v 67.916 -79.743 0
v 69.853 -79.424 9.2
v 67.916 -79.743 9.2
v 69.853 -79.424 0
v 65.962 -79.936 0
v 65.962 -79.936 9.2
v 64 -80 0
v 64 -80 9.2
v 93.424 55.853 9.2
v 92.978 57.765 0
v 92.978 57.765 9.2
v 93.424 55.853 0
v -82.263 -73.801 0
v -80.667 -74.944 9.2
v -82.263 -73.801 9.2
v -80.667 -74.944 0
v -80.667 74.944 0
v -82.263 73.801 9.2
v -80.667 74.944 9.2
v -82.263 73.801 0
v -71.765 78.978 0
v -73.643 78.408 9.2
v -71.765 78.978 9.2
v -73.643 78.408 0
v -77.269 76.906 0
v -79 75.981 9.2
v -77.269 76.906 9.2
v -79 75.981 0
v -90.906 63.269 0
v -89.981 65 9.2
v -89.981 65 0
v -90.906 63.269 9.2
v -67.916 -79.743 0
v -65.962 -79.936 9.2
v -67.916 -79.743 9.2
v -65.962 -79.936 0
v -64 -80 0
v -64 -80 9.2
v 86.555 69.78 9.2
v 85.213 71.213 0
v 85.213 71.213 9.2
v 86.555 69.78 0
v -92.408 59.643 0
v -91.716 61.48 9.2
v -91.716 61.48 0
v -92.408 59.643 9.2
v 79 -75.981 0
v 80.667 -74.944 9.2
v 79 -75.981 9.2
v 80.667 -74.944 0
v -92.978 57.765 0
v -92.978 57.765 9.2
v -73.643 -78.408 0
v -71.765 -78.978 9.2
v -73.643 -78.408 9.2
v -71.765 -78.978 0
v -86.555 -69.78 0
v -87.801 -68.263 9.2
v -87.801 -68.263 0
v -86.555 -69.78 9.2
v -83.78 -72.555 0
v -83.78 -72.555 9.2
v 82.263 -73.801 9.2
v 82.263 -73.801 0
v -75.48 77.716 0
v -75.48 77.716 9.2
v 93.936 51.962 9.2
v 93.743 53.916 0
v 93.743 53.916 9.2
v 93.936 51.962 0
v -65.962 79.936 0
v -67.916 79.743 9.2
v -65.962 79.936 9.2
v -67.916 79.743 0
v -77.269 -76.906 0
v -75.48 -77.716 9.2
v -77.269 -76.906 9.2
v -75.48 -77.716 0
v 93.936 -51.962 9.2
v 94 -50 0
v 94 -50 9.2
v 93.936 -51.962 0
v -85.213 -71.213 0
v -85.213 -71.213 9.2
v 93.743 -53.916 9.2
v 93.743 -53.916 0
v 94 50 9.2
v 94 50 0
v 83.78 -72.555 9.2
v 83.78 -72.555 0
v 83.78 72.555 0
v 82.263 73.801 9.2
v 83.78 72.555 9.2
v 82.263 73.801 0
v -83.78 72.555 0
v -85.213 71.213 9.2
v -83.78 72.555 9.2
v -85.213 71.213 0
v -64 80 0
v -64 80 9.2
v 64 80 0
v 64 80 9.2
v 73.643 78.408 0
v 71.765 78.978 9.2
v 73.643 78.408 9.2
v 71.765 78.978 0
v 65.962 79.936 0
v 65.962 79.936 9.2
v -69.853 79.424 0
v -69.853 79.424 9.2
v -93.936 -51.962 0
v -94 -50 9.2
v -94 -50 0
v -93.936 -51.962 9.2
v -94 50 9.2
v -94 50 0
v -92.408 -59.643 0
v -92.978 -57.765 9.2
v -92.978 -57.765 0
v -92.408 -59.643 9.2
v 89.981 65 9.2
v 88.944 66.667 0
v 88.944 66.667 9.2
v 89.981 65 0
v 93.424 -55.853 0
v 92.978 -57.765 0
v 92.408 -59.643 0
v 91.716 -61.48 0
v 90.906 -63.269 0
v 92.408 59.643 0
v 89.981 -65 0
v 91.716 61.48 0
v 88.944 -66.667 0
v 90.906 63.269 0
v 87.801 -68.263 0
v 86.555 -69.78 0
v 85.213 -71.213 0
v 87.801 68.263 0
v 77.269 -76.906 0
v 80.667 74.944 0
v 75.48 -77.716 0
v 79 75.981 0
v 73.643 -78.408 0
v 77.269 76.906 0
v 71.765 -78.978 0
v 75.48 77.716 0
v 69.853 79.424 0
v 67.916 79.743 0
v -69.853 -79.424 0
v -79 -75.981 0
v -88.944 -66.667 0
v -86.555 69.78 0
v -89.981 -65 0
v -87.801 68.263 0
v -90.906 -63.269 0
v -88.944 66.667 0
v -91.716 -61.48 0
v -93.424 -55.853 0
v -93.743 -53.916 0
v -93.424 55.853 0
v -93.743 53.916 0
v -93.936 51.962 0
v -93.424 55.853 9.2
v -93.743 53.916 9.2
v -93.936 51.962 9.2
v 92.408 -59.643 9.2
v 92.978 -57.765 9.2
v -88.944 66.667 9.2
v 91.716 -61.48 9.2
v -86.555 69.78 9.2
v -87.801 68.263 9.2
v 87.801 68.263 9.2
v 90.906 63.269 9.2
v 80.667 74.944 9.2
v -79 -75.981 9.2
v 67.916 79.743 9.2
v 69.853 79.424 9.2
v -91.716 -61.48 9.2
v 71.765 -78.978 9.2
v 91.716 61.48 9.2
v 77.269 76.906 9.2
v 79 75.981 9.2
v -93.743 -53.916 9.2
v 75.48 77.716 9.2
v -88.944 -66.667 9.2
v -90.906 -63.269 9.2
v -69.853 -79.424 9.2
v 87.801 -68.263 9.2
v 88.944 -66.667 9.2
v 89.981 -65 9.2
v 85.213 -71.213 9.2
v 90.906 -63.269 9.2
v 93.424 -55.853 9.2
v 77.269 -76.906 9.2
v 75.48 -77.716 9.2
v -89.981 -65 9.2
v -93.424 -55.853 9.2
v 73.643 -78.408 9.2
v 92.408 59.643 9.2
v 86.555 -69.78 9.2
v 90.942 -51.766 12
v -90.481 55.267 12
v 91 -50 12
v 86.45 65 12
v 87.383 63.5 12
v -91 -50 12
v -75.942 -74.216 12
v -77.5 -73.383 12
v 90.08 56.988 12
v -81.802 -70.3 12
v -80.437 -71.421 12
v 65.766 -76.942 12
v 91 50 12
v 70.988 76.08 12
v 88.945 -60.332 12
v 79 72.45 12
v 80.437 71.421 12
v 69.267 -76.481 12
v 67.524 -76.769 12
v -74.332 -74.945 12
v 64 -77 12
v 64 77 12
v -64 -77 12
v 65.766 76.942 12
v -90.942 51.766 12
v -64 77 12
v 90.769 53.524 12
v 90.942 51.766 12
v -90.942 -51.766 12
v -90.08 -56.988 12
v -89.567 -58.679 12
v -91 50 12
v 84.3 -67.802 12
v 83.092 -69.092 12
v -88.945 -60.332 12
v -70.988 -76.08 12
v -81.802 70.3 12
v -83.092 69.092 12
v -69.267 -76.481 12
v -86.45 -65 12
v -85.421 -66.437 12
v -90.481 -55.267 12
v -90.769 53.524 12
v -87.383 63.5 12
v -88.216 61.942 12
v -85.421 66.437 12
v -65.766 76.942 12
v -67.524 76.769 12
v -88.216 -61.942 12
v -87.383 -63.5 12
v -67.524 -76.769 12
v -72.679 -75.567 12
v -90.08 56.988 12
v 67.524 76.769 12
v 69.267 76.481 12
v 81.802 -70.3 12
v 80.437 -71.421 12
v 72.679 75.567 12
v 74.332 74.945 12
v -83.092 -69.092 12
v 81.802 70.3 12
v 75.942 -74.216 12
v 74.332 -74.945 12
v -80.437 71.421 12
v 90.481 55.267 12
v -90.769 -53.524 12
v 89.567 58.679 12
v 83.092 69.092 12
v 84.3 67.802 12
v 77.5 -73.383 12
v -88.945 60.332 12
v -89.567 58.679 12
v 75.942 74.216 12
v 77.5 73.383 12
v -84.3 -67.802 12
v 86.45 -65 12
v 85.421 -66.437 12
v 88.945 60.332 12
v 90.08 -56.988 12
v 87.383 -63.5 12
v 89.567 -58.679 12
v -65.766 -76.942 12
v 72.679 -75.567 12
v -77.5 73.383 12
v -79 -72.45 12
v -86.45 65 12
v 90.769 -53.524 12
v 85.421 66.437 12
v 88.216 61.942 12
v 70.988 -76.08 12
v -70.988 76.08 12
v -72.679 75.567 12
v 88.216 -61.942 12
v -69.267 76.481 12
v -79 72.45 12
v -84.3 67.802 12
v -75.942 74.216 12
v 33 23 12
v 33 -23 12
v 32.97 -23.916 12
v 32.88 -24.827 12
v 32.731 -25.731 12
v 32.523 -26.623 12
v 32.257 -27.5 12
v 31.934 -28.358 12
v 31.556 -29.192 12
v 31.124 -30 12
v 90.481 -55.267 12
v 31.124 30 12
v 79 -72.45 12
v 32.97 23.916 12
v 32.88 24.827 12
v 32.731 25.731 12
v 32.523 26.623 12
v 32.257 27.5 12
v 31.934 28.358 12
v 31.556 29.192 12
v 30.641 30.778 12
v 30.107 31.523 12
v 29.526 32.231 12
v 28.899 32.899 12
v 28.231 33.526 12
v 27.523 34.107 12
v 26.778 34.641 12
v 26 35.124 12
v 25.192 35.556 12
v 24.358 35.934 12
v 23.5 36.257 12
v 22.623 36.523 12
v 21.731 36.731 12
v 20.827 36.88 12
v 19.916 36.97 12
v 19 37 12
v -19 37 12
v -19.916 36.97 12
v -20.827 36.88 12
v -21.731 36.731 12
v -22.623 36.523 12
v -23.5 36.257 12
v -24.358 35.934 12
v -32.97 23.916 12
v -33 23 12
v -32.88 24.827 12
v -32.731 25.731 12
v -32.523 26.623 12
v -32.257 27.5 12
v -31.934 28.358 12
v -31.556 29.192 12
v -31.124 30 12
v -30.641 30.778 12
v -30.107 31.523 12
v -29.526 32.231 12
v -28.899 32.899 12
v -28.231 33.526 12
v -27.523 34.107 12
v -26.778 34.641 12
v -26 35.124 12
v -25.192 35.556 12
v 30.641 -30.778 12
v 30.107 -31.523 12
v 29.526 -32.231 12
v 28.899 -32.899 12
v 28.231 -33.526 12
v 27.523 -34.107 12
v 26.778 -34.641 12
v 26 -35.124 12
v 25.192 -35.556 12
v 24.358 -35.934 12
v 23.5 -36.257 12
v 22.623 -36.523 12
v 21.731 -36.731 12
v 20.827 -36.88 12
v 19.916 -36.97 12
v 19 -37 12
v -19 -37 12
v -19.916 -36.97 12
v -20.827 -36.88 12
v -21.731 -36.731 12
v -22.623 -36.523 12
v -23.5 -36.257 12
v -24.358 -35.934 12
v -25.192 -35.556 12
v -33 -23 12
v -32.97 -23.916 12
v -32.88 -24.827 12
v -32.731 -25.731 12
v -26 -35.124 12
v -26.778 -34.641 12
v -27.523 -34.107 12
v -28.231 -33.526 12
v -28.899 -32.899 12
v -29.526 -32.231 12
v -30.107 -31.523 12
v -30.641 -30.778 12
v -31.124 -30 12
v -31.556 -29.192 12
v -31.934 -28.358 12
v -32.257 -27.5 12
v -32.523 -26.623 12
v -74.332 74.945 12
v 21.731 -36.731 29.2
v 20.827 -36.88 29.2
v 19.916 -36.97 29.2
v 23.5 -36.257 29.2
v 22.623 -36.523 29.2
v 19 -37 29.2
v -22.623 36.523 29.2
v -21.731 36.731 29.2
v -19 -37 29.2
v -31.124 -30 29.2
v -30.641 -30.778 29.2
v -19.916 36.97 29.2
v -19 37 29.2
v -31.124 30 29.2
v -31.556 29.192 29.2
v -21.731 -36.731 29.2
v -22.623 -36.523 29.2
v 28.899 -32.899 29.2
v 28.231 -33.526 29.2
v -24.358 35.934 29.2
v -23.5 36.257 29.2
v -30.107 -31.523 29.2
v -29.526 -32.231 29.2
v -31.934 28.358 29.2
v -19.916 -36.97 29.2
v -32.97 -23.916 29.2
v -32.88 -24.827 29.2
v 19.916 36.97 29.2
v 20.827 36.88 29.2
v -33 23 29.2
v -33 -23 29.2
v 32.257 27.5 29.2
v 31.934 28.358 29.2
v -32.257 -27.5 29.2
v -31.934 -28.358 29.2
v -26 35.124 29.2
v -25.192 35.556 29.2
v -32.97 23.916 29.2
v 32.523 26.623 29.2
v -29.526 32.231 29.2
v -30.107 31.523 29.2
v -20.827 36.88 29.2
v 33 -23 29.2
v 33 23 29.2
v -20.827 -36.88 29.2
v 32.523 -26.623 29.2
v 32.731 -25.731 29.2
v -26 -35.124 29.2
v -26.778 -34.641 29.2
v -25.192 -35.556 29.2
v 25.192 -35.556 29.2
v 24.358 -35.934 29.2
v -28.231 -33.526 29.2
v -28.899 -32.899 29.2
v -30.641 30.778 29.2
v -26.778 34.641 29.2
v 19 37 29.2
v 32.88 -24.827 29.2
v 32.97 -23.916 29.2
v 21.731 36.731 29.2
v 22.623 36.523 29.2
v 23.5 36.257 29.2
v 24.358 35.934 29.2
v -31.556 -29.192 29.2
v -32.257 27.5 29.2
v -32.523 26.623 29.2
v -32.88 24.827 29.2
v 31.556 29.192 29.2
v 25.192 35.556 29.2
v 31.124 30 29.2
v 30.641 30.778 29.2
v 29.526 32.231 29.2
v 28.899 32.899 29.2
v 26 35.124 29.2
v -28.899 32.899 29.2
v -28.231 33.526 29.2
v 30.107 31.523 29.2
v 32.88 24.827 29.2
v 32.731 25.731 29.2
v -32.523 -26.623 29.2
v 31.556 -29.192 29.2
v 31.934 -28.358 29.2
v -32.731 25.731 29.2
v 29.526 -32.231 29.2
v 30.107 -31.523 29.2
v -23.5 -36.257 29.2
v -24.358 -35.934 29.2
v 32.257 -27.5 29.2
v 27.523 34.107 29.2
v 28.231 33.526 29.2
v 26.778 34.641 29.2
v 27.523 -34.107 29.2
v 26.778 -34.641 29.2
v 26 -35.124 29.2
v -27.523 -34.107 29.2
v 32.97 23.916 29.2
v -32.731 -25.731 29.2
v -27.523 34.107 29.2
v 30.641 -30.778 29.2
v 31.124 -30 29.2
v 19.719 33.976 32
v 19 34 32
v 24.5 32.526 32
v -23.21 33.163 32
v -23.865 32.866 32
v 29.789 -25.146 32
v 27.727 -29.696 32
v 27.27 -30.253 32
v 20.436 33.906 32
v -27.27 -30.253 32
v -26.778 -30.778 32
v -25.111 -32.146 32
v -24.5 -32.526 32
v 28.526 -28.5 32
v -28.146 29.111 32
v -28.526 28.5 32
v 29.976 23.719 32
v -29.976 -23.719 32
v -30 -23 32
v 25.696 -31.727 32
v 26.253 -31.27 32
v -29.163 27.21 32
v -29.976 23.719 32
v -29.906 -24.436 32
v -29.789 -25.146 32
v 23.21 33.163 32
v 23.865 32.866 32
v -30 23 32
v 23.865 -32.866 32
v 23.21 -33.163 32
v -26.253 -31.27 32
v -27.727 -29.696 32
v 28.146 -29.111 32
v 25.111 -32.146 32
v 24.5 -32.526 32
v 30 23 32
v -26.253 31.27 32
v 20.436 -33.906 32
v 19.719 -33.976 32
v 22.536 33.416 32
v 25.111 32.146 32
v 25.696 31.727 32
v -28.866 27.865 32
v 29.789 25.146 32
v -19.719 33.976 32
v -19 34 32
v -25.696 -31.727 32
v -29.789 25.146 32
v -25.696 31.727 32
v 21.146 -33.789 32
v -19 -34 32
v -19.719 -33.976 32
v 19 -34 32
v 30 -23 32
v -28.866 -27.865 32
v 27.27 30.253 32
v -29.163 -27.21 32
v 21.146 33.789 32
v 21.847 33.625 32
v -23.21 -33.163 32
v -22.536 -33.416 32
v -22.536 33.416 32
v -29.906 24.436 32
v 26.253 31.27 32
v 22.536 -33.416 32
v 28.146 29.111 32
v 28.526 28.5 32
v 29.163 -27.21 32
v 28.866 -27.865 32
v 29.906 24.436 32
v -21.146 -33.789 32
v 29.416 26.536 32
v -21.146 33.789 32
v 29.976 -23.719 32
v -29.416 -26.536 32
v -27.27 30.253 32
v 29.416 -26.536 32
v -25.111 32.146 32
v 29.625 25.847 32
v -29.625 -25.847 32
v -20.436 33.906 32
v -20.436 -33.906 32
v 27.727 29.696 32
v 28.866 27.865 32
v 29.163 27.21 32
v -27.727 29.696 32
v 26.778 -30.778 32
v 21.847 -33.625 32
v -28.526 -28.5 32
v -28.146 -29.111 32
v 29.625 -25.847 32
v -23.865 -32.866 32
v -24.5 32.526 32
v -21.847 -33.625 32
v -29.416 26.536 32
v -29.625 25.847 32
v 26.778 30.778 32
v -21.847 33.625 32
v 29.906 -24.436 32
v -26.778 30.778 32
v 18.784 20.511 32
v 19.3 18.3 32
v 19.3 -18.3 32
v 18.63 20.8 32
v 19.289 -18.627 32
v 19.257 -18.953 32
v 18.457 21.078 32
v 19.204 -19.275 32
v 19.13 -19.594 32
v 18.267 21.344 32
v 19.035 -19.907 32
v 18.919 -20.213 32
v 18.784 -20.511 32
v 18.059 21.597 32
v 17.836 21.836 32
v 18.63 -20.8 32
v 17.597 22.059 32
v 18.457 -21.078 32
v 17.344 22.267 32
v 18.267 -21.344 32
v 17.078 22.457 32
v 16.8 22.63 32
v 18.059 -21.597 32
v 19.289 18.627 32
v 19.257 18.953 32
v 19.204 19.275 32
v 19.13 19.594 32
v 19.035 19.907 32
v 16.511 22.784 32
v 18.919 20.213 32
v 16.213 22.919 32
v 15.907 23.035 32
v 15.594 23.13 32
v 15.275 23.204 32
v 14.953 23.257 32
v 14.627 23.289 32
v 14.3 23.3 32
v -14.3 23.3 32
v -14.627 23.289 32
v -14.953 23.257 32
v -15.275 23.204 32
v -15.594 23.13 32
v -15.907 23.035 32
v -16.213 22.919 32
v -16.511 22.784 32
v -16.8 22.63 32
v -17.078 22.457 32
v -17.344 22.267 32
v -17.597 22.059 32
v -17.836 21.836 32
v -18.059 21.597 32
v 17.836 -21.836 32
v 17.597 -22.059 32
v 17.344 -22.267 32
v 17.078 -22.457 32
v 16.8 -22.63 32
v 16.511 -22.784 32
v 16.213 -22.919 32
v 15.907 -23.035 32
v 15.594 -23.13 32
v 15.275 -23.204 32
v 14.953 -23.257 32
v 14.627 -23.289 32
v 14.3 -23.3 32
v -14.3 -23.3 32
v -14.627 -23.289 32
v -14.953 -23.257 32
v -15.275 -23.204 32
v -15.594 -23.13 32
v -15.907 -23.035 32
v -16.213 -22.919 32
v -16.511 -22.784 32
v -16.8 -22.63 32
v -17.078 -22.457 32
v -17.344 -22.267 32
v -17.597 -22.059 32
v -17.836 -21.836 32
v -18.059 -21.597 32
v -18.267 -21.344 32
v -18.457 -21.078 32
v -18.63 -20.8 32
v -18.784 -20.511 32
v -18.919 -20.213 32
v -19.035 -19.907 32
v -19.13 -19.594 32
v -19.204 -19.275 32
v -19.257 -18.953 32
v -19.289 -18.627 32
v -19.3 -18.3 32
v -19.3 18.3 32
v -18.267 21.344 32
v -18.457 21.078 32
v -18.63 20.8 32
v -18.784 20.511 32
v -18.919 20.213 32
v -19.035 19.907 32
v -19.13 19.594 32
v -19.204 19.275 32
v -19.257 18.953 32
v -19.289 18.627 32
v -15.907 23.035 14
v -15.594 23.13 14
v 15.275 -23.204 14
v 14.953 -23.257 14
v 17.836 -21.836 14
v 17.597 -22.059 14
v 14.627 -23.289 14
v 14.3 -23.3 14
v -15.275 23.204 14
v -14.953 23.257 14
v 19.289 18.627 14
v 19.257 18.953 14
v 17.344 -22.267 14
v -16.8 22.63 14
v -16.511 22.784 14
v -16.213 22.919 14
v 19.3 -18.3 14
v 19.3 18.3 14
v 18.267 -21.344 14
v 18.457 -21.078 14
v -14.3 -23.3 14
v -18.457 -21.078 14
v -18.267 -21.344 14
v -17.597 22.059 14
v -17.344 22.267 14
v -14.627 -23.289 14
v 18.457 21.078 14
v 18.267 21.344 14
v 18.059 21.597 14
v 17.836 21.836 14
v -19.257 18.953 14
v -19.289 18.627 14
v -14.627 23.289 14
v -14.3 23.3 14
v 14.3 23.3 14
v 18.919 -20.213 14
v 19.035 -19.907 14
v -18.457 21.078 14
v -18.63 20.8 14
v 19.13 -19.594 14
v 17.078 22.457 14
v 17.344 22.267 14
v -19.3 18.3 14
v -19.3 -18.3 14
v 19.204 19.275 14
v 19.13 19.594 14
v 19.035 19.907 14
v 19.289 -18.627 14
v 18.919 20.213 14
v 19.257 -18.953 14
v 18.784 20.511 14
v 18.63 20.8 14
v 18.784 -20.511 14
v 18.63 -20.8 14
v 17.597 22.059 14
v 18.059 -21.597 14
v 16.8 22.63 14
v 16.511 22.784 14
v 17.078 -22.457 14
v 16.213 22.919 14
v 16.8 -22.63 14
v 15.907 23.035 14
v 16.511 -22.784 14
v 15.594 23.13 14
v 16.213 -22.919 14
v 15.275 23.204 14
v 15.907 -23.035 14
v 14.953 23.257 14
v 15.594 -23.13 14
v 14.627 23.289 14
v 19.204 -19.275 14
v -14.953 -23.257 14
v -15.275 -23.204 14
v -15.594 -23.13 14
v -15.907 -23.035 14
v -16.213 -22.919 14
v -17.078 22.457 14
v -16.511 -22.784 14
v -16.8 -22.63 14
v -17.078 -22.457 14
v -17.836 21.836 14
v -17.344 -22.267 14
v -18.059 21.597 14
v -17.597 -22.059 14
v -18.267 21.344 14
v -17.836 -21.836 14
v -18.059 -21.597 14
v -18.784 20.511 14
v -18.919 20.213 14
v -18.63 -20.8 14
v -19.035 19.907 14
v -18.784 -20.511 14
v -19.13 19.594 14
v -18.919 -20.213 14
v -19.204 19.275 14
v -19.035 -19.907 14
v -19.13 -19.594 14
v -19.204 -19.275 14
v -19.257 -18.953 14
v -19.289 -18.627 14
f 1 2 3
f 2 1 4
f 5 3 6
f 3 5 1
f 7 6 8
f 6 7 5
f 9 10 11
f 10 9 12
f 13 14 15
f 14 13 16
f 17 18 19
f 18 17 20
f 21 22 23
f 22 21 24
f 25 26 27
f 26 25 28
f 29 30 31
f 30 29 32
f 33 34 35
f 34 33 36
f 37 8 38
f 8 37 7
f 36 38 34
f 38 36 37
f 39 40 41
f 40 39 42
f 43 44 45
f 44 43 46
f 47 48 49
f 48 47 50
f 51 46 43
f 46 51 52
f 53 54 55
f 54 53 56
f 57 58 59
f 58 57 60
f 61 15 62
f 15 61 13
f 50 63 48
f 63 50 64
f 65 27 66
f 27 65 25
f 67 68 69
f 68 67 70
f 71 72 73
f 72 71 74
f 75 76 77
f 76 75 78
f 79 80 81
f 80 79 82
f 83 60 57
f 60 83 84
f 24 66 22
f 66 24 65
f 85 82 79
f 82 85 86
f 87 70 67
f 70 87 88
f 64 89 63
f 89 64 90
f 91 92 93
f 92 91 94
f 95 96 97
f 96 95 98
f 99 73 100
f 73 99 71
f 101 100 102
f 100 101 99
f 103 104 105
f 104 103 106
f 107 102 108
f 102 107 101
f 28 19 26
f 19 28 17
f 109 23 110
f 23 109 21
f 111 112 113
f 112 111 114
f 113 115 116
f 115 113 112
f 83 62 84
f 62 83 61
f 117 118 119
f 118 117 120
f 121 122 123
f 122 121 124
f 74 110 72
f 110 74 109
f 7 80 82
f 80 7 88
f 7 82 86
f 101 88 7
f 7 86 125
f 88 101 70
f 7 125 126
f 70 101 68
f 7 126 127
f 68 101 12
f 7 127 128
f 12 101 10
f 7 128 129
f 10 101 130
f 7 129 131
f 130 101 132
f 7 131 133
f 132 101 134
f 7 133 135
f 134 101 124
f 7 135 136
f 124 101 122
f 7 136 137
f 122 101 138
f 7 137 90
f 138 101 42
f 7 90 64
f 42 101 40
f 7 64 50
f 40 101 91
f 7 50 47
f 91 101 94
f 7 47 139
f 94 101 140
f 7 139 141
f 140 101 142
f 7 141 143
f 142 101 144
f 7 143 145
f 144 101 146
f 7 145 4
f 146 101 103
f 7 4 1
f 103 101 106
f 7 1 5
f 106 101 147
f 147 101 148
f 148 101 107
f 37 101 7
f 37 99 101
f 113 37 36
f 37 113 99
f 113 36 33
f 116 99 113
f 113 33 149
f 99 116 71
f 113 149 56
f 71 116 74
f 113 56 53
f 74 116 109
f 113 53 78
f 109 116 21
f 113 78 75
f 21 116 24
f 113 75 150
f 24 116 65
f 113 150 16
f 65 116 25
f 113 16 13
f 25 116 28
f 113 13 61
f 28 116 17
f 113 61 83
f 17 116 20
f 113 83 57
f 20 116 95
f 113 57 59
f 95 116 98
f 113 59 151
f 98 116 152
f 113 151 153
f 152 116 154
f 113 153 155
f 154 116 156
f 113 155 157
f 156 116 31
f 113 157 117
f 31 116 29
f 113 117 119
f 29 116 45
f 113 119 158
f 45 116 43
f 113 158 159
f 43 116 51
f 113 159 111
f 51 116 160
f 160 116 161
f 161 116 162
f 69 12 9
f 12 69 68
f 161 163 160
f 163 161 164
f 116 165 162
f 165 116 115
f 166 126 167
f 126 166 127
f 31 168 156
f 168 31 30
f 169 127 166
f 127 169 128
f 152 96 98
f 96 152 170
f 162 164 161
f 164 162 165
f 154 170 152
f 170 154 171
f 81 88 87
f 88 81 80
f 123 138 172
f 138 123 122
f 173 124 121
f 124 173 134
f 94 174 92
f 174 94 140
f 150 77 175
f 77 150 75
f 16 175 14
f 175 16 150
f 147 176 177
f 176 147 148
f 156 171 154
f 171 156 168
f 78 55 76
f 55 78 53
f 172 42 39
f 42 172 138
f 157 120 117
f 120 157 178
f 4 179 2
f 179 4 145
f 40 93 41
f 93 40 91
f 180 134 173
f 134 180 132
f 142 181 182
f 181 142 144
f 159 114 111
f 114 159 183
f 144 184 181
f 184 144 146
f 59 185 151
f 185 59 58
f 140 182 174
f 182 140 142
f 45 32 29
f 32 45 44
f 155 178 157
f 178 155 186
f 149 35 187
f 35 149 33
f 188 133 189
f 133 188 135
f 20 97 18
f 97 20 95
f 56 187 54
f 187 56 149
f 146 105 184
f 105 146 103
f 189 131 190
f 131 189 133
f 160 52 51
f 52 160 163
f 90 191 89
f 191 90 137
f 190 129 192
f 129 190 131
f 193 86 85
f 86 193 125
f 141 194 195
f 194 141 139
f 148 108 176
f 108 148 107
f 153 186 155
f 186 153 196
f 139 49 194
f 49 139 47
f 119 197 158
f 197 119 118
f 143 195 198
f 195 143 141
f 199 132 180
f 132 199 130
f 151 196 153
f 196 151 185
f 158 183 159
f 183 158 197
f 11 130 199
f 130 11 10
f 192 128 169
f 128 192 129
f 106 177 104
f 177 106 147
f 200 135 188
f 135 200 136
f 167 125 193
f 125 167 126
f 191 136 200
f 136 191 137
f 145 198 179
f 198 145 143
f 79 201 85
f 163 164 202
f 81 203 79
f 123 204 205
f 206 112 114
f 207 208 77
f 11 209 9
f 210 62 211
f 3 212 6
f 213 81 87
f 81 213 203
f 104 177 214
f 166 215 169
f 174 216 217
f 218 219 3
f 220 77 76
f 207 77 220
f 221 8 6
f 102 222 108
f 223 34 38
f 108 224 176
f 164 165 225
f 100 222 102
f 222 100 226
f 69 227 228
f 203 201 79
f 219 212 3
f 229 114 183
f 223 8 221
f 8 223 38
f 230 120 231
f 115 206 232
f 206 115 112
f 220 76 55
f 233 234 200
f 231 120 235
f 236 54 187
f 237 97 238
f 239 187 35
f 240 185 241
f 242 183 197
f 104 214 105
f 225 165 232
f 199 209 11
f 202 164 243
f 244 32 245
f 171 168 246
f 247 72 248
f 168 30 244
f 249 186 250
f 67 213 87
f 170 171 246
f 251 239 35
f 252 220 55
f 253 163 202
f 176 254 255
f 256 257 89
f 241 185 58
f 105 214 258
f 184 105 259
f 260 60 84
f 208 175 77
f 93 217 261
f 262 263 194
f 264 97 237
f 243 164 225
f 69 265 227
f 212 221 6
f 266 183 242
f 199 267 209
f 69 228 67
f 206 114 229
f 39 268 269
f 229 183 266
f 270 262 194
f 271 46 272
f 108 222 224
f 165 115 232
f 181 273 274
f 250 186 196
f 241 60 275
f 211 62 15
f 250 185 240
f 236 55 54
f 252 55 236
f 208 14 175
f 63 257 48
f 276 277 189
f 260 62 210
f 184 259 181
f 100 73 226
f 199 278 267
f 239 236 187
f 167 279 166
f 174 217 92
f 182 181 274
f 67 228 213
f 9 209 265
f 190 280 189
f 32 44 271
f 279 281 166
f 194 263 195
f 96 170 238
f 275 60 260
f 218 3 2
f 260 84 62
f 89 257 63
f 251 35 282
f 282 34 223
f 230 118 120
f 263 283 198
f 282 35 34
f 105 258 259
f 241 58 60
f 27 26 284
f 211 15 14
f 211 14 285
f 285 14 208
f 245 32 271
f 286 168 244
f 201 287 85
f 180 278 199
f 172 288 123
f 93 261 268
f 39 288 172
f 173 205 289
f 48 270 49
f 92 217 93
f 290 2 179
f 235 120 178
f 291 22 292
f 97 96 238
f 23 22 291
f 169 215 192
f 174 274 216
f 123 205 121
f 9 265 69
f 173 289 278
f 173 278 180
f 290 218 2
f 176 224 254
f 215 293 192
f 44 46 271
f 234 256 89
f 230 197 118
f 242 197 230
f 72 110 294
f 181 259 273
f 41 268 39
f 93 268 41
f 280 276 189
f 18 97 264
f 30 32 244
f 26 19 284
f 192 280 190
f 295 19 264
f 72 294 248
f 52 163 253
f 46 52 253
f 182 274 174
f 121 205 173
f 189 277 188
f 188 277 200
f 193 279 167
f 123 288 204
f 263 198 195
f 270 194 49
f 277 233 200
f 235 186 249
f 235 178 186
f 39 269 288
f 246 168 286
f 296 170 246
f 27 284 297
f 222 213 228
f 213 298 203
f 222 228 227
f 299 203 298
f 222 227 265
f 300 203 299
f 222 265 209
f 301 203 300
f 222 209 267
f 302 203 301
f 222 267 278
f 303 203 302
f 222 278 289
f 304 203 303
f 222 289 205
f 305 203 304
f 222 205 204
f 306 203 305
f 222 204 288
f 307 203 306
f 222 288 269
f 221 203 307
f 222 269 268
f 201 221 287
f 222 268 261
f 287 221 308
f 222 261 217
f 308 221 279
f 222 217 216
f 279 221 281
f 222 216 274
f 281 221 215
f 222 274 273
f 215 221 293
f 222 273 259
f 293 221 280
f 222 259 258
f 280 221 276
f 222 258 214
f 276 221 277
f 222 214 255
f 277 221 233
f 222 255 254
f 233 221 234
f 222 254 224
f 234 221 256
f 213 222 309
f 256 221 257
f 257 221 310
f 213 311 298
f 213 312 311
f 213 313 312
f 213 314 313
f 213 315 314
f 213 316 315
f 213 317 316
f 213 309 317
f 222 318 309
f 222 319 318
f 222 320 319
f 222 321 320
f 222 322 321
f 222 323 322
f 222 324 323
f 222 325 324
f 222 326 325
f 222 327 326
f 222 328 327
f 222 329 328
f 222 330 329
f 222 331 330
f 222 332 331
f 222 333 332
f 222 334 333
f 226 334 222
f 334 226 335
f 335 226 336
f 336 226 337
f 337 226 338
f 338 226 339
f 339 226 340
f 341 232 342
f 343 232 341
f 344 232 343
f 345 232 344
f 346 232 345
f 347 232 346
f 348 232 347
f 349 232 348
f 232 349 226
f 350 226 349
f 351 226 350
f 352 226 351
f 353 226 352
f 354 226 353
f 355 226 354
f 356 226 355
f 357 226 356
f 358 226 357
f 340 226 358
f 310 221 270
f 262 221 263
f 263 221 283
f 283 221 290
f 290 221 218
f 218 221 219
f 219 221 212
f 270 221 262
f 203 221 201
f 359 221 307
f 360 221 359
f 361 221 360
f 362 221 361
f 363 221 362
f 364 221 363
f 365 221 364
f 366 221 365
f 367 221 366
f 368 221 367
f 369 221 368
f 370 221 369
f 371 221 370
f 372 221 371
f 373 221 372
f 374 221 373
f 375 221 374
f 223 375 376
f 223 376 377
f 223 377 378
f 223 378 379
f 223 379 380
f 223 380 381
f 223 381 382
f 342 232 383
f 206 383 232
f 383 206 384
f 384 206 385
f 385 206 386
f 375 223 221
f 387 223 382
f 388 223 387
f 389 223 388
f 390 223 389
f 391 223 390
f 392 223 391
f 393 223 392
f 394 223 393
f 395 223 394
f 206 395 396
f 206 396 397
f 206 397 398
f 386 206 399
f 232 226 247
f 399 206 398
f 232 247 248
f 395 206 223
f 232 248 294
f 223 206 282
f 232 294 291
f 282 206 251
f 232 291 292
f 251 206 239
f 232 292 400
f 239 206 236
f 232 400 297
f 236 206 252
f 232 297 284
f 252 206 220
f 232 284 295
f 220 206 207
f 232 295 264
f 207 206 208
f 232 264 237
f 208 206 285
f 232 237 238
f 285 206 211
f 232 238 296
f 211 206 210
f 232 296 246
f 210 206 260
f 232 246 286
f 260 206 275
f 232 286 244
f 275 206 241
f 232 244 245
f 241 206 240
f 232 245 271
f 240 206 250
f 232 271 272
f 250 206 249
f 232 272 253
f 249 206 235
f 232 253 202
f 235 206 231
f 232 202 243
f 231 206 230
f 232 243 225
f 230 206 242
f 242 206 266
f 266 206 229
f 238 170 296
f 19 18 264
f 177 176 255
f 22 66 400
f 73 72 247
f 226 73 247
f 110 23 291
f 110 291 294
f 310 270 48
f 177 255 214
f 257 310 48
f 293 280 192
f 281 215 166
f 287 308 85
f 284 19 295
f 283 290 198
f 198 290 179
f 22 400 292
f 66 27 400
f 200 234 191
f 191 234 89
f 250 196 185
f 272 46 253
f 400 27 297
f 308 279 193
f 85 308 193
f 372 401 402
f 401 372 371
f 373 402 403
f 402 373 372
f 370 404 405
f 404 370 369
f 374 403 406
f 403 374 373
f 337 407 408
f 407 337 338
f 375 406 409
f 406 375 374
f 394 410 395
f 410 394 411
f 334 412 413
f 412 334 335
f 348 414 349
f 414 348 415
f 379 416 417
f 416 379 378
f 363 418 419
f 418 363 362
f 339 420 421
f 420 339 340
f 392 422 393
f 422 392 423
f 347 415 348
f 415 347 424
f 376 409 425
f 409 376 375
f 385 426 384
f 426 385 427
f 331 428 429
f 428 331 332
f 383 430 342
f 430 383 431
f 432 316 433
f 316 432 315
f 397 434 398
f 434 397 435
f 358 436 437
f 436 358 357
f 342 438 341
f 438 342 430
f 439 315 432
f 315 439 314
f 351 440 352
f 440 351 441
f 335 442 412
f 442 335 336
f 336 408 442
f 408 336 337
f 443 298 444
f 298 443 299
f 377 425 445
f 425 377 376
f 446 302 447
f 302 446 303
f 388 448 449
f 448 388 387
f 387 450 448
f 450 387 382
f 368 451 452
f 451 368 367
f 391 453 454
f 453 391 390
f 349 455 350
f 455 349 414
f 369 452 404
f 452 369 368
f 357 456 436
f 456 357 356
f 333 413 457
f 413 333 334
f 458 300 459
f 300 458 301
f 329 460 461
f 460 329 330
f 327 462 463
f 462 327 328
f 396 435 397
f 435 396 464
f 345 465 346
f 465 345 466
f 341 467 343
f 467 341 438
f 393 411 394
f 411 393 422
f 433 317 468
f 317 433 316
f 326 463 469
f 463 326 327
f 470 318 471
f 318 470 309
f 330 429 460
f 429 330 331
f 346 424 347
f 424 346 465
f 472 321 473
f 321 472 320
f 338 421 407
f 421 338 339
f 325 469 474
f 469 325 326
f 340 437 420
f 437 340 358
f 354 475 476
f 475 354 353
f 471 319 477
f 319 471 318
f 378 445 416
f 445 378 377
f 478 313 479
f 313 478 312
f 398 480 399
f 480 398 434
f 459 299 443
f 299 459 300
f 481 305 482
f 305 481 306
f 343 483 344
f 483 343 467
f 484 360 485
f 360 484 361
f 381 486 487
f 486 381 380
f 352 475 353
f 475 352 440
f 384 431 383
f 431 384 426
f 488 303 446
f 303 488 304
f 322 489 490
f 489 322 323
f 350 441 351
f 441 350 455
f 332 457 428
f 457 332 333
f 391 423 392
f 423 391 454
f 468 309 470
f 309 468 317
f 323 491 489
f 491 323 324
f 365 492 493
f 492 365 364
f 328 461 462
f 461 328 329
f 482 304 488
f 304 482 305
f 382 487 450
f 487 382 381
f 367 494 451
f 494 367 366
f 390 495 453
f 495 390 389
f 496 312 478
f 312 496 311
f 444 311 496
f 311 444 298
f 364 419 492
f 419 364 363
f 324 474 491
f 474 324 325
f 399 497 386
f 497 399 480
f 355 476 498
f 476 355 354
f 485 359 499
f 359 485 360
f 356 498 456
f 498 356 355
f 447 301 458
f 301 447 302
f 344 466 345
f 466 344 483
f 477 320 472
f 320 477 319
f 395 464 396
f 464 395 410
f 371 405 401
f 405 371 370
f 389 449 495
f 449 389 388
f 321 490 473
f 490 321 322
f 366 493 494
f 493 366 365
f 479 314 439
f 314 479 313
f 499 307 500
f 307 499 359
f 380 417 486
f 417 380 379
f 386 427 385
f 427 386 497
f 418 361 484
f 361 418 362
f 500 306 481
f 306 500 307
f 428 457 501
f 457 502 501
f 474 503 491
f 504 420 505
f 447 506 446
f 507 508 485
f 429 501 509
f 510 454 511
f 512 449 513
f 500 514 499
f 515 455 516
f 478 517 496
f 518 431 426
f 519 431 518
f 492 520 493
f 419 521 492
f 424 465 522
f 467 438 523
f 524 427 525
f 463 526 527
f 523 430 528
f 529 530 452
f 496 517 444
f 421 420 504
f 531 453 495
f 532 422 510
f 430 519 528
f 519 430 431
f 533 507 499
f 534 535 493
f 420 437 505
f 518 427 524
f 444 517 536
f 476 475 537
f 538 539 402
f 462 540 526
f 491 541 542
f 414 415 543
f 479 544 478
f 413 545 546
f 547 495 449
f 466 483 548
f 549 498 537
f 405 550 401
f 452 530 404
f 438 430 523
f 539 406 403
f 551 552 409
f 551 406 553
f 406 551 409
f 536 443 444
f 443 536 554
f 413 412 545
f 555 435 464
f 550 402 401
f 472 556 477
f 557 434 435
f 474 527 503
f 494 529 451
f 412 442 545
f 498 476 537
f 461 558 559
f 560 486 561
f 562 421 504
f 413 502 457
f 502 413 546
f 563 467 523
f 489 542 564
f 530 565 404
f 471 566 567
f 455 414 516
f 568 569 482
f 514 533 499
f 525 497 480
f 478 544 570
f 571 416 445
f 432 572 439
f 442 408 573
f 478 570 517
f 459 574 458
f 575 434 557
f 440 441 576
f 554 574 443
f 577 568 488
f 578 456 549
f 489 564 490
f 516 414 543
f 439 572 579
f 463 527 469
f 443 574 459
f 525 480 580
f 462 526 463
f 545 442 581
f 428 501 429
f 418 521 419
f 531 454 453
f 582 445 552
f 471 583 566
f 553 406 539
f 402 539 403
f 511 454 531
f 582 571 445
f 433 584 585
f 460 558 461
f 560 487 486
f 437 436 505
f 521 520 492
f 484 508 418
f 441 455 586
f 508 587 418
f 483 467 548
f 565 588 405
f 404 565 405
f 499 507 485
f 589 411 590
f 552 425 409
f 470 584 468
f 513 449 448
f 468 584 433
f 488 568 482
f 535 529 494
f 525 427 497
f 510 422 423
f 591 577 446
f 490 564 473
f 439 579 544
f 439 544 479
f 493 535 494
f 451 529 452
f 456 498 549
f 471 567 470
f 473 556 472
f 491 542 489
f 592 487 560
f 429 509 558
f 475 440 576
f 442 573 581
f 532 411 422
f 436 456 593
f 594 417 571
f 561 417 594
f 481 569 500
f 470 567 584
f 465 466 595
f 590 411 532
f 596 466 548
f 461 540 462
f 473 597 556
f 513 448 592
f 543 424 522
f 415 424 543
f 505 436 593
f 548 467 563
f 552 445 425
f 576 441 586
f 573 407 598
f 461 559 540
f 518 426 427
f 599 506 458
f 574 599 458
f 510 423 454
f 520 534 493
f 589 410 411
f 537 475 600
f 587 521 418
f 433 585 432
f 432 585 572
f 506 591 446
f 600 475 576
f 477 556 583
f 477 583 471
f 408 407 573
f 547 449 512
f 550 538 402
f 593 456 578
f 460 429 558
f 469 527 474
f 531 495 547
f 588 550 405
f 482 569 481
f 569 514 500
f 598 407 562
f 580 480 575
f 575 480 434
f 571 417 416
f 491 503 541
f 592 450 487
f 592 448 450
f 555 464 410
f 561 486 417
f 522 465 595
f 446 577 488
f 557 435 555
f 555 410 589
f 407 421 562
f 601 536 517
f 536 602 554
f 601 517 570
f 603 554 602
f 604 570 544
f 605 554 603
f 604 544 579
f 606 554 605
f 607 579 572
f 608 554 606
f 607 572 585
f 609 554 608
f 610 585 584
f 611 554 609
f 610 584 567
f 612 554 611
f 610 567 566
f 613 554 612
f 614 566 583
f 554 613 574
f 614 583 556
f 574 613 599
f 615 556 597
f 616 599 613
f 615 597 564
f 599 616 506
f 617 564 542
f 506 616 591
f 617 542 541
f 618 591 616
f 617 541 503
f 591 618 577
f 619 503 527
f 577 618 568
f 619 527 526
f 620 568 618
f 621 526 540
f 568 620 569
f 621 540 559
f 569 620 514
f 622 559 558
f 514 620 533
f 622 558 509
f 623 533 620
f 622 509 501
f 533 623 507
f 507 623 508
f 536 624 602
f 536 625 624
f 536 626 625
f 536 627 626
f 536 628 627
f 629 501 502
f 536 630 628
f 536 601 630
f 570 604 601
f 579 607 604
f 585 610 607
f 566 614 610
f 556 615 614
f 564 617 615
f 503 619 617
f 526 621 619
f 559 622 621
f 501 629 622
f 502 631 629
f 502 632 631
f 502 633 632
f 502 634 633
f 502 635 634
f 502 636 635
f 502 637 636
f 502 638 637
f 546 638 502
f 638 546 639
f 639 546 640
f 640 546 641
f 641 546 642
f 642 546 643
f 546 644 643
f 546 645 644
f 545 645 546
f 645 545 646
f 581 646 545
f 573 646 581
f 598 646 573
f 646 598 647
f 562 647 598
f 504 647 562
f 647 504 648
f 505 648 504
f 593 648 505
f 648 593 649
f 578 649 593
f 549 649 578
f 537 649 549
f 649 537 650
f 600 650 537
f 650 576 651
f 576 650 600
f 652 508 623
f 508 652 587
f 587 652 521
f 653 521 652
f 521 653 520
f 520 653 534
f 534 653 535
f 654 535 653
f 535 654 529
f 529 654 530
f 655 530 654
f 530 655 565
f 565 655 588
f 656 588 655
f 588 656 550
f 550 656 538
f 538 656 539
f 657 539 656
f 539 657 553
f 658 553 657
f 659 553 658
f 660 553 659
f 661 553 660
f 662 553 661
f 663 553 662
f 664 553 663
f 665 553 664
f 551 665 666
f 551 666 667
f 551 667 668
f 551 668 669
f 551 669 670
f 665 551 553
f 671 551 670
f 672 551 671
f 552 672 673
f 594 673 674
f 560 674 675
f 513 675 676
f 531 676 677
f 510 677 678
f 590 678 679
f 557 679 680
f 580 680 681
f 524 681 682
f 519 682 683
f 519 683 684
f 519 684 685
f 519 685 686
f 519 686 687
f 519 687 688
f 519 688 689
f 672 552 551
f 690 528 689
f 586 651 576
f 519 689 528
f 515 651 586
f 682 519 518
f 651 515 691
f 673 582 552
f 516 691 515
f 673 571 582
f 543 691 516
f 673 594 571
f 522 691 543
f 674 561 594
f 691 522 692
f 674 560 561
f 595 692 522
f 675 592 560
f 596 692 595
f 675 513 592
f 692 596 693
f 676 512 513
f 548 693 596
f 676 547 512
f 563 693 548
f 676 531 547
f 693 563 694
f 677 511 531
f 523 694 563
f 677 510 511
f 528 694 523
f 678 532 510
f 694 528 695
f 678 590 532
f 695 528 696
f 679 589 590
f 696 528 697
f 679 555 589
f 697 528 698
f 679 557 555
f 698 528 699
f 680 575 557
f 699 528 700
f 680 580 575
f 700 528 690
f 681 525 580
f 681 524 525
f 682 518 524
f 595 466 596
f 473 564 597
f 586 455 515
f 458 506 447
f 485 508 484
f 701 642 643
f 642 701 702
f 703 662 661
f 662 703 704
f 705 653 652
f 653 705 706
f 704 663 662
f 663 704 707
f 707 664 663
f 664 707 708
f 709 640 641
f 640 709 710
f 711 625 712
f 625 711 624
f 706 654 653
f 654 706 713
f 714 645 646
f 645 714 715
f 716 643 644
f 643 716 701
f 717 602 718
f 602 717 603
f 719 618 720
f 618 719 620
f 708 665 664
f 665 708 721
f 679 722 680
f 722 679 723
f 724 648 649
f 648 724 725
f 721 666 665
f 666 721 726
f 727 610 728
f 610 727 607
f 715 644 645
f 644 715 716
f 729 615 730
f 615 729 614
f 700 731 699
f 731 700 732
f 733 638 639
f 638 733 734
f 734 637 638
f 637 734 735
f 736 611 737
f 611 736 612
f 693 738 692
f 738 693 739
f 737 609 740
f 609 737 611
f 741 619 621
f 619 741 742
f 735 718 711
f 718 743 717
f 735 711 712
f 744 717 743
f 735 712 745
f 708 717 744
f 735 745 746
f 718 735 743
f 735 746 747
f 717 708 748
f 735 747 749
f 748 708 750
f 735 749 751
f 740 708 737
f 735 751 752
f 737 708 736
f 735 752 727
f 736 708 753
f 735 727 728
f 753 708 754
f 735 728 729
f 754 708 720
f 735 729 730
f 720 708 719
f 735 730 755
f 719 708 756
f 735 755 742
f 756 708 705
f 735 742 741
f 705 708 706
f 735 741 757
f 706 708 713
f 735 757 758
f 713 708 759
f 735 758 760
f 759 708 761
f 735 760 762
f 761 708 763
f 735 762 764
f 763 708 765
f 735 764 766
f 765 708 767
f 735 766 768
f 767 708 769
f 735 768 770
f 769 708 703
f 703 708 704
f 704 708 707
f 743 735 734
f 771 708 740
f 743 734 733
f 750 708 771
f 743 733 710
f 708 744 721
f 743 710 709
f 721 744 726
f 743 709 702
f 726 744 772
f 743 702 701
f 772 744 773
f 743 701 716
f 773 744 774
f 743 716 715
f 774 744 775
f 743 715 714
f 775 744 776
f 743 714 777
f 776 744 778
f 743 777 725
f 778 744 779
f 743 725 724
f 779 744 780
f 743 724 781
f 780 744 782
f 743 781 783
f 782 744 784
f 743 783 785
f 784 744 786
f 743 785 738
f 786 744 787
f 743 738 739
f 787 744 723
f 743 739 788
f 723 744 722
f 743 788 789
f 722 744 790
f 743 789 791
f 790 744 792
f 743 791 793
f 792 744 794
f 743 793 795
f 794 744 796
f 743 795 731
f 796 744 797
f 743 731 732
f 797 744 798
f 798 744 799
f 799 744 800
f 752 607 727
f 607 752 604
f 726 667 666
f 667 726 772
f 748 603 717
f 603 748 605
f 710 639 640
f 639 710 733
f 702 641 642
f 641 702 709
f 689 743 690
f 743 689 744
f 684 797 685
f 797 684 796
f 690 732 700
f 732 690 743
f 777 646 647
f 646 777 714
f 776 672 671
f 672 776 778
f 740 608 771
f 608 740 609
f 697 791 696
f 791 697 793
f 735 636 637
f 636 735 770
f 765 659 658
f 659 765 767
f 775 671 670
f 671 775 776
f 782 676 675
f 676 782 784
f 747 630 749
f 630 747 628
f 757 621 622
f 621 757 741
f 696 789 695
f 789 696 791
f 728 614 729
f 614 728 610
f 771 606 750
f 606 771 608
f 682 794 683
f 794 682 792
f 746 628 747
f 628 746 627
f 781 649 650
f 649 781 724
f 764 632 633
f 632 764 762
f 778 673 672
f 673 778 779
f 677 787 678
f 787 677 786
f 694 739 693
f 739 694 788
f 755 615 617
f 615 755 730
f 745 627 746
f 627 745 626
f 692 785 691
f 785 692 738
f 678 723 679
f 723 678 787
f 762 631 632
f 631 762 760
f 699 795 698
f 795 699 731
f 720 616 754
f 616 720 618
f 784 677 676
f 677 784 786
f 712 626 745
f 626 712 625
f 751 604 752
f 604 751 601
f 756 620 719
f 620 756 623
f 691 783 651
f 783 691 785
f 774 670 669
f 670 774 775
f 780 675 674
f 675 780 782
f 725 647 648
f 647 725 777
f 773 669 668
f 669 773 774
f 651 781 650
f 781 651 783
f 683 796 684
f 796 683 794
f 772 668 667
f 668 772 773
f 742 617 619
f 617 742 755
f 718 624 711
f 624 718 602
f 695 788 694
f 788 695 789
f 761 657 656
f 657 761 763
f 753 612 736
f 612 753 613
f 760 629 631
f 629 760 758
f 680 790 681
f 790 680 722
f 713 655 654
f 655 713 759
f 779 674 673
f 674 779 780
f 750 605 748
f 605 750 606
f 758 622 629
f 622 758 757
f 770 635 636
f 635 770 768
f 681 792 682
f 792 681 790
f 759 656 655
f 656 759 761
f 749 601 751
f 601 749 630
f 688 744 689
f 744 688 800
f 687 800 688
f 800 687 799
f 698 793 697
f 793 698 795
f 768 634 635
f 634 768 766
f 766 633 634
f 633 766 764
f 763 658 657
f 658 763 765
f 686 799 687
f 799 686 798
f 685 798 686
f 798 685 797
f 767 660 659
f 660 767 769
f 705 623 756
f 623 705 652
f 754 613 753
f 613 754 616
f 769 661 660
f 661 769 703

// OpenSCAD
// Headphone stand in three printable parts: base, post, hanger.
// No glue, no screws. Rectangular (non-round) blade tenons prevent spinning.
// All dimensions in mm. Print orientation is the exported orientation (+Z up).
//
// Assembly heights (assembly coordinates, desk at z=0):
//   base plate/boss top        0 .. 32
//   post                       14.5 .. 250  (17.5 mm of it inside the base socket)
//   hanger tenon               228.5 .. 250 (21.5 mm inside the post socket)
//   hanger saddle top centre   270
// Socket clearances: 0.3 mm per side (socket is tenon + 0.6 in each dimension),
// tenon tips stop 0.5 mm above socket floors; shoulders/faces give the depth stop
// for the hanger, and the post bottoms in its socket.

part = "base"; // [base, post, hanger, assembly]
cadverify_only = "";

$fn = 96;

/* [Base] */
base_w = 188;          // desk footprint, X
base_d = 160;          // desk footprint, Y
base_plate_top = 9;    // straight plate wall up to here, then 45 deg chamfer to 12
base_top_plate = 12;
boss_w = 66;
boss_d = 74;
boss_straight_top = 29; // then 45 deg chamfer to boss_top
boss_top = 32;
base_socket_w = 38.6;  // post 38 + 0.6
base_socket_d = 46.6;  // post 46 + 0.6
base_socket_floor = 14;

/* [Post] */
post_w = 38;
post_d = 46;
post_len = 235.5;      // tip (local z=0) to top (assembly 250)
post_top_socket_w = 24.6; // hanger tenon 24 + 0.6
post_top_socket_d = 34.6; // hanger tenon 34 + 0.6
post_top_socket_floor_local = 213.5; // assembly 228

/* [Hanger, modelled in print coordinates] */
// Print coordinates: X = saddle length, Y = height above tenon tip,
// Z = saddle width direction (part lies on its Z=0 side face on the bed).
hang_len_half = 69;    // overall saddle half length incl. rounded end point
hang_width = 34;       // >= 30 mm headband support width
hang_top_rel = 41.5;   // tenon tip to saddle crown; assembly 228.5 + 41.5 = 270
hang_arc_r = 170;      // crown radius of the headband contact surface
hang_plate_t = 10;     // saddle plate thickness (vertical, in profile)
hang_tenon_half_w = 12;  // tenon is 24 (X) x 34 (width)
hang_shoulder_rel = 21.5; // assembly 250, post top
hang_neck_half_w = 17;

function hang_top_z(x) = hang_top_rel - (hang_arc_r - sqrt(hang_arc_r*hang_arc_r - x*x));
function hang_bot_z(x) = hang_top_z(x) - hang_plate_t;

module rounded_rect(w, d, r) {
    offset(r = r) square([w - 2*r, d - 2*r], center = true);
}

module instance(name, part_name, unit = 1) {
    echo(cadverify_instance = [name, part_name, unit]);
    if (cadverify_only == "" || cadverify_only == name) children();
}

/* ---------- BASE (print = assembly orientation) ---------- */
module base_part() {
    difference() {
        // Outer corners of the plate and boss are rounded in plan view (corner
        // radius >= 6 mm) and the top rims have 45 deg x 3 mm chamfers, so
        // nothing sticks out beyond the bounding box or the support plane.
        union() {
            // desk plate with 45 deg top edge chamfer
            linear_extrude(base_plate_top) rounded_rect(base_w, base_d, 30);
            hull() {
                translate([0, 0, base_plate_top]) linear_extrude(0.2)
                    rounded_rect(base_w, base_d, 30);
                translate([0, 0, base_top_plate - 0.2]) linear_extrude(0.2)
                    rounded_rect(base_w - 6, base_d - 6, 27);
            }
            // raised boss / collar around the post socket, 45 deg top chamfer
            translate([0, 0, base_top_plate])
                linear_extrude(boss_straight_top - base_top_plate)
                    rounded_rect(boss_w, boss_d, 14);
            hull() {
                translate([0, 0, boss_straight_top]) linear_extrude(0.2)
                    rounded_rect(boss_w, boss_d, 14);
                translate([0, 0, boss_top - 0.2]) linear_extrude(0.2)
                    rounded_rect(boss_w - 6, boss_d - 6, 11);
            }
        }
        // blind rectangular socket for the post (stops post spinning)
        translate([0, 0, base_socket_floor])
            linear_extrude(boss_top - base_socket_floor + 2)
                rounded_rect(base_socket_w, base_socket_d, 5);
    }
}

/* ---------- POST (printed upright, local z=0 is tenon tip) ---------- */
module post_part() {
    difference() {
        // Solid rectangular column, corners rounded 8 mm in plan view.
        linear_extrude(post_len) rounded_rect(post_w, post_d, 8);
        // Blind rectangular socket in the top for the hanger blade tenon:
        // tenon + 0.6 mm per side (0.3 mm clearance); the non-round rectangle
        // is what stops the hanger spinning on the post.
        translate([0, 0, post_top_socket_floor_local])
            linear_extrude(post_len - post_top_socket_floor_local + 2)
                rounded_rect(post_top_socket_w, post_top_socket_d, 5);
    }
}

/* ---------- HANGER (printed on its side) ---------- */
module hanger_part() {
    top_pts    = [for (x = [56 : -8 : -56]) [x, hang_top_z(x)]];
    bot_r_pts  = [for (x = [48 : 8 : 64]) [x, hang_bot_z(x)]];
    bot_l_pts  = [for (x = [-64 : 8 : -48]) [x, hang_bot_z(x)]];
    mid64 = (hang_top_z(64) + hang_bot_z(64)) / 2;
    // Saddle/neck profile above the shoulder plane (print y = hang_shoulder_rel).
    profile = concat(
        [[-hang_neck_half_w, hang_shoulder_rel], [hang_neck_half_w, hang_shoulder_rel],
         [30, hang_bot_z(30)]],
        bot_r_pts,
        [[hang_len_half - 0.5, mid64], [64, hang_top_z(64)]],
        top_pts,
        [[-64, hang_top_z(64)], [-(hang_len_half - 0.5), mid64], [-64, hang_bot_z(64)]],
        bot_l_pts,
        [[-30, hang_bot_z(30)]]
    );
    difference() {
        union() {
            linear_extrude(hang_width) polygon(profile);
            // Blade tenon below the shoulder: 24 x 34 with 4 mm corner radii,
            // so it clears the post socket's 5 mm rounded corners. It reaches
            // 2 mm up into the neck so the union is volumetric, not face-only.
            translate([0, 0, hang_width/2]) rotate([-90, 0, 0])
                linear_extrude(hang_shoulder_rel + 2)
                    rounded_rect(2*hang_tenon_half_w, hang_width, 4);
        }
        // 45 deg chamfers on the two crown side edges, limited to the central
        // contact zone |x| <= 36. Each box is the half-space beyond its
        // chamfer plane, rotated -45 deg about X from an origin on the plane:
        //   far side keeps Y + Z <= hang_top_z(36) + hang_width
        //   bed side keeps Y - Z <= hang_top_z(36)
        // At |x| = 36 the crown meets the plane, so beyond it the plate keeps
        // its full 34 mm width; at the centre the chamfers leave a ~30.7 mm
        // flat crown. The bed-side chamfer face itself is exactly 45 deg.
        translate([0, hang_top_z(36), hang_width]) rotate([-45, 0, 0])
            translate([-36, 0, 0]) cube([72, 40, 40]);
        translate([0, hang_top_z(36), 0]) rotate([-45, 0, 0])
            translate([-36, 0, 0]) cube([72, 40, 40]);
    }
}

/* ---------- Spec echoes ---------- */
if (part == "base") {
    echo(cadverify_spec = [
        ["bounds", [[-base_w/2, -base_d/2, 0], [base_w/2, base_d/2, boss_top]]],
        ["bodies", 1],
        ["through_holes", 0],
        ["support_faces", [["desk", "-z", 25000]]],
        ["overhangs_allowed", []],
        ["copies", 1],
        ["details", [
            ["plate", "material", [[-80, -60, 2], [80, 60, 10]], 0.99],
            ["boss_wall", "material", [[22, -30, 16], [31, 30, 28]], 0.99],
            ["post_socket", "void", [[-17, -21, 16], [17, 21, 30]], 0.99],
            ["socket_floor", "thickness", [0, 0, 42], [0, 0, -1], base_socket_floor],
            ["boss_socket_top", "view", [[-34, -38, 27], [34, 38, boss_top]]]
        ]]
    ]);
} else if (part == "post") {
    echo(cadverify_spec = [
        ["bounds", [[-post_w/2, -post_d/2, 0], [post_w/2, post_d/2, post_len]]],
        ["bodies", 1],
        ["through_holes", 0],
        ["support_faces", [["bed", "-z", 1500]]],
        ["overhangs_allowed", []],
        ["copies", 1],
        ["details", [
            ["column", "material", [[-16, -20, 30], [16, 20, 200]], 0.99],
            ["hanger_socket", "void", [[-10, -15, 216], [10, 15, 234]], 0.99],
            ["column_width", "thickness", [32, 0, 100], [-1, 0, 0], post_w],
            ["top_socket", "view", [[-19, -23, 210], [19, 23, post_len]]]
        ]]
    ]);
} else if (part == "hanger") {
    // actual extreme points are the saddle end tips at +-(hang_len_half - 0.5)
    echo(cadverify_spec = [
        ["bounds", [[-(hang_len_half - 0.5), 0, 0], [hang_len_half - 0.5, hang_top_rel, hang_width]]],
        ["bodies", 1],
        ["through_holes", 0],
        ["support_faces", [["bed", "-z", 1200]]],
        ["overhangs_allowed", [
            ["45deg crown chamfer on bed side", [[-36, 37, 0], [36, hang_top_rel, 5]]]
        ]],
        ["copies", 1],
        ["details", [
            ["saddle_plate", "material", [[-25, 32, 5], [25, 38, 29]], 0.99],
            ["tenon", "material", [[-10, 2, 5], [10, 20, 29]], 0.99],
            ["saddle_thickness", "thickness", [50, 52, 17], [0, -1, 0], hang_plate_t],
            ["rounded_crown", "view", [[-40, 27, 0], [40, hang_top_rel, hang_width]]]
        ]]
    ]);
} else if (part == "assembly") {
    echo(cadverify_spec = [
        ["bounds", [[-base_w/2, -base_d/2, 0], [base_w/2, base_d/2, 270]]],
        ["support_faces", [["desk", "-z", 25000]]],
        ["allowed_interferences", []],
        ["assembly_order", [
            [["base"], [0, 0, 0]],
            [["post"], [0, 0, -1]],
            [["hanger"], [0, 0, -1]]
        ]]
    ]);
}

/* ---------- Output ---------- */
if (part == "base") {
    base_part();
} else if (part == "post") {
    post_part();
} else if (part == "hanger") {
    hanger_part();
} else if (part == "assembly") {
    instance("base", "base") base_part();
    instance("post", "post") translate([0, 0, 14.5]) post_part();
    // hanger print coords (x, y=height rel. tenon tip, z=width)
    //   -> assembly (x, 17-z, 228.5+y): tenon tip at 228.5, crown at 270
    instance("hanger", "hanger")
        translate([0, hang_width/2, 228.5]) rotate([90, 0, 0]) hanger_part();
} else {
    assert(false, str("unknown part: ", part));
}
